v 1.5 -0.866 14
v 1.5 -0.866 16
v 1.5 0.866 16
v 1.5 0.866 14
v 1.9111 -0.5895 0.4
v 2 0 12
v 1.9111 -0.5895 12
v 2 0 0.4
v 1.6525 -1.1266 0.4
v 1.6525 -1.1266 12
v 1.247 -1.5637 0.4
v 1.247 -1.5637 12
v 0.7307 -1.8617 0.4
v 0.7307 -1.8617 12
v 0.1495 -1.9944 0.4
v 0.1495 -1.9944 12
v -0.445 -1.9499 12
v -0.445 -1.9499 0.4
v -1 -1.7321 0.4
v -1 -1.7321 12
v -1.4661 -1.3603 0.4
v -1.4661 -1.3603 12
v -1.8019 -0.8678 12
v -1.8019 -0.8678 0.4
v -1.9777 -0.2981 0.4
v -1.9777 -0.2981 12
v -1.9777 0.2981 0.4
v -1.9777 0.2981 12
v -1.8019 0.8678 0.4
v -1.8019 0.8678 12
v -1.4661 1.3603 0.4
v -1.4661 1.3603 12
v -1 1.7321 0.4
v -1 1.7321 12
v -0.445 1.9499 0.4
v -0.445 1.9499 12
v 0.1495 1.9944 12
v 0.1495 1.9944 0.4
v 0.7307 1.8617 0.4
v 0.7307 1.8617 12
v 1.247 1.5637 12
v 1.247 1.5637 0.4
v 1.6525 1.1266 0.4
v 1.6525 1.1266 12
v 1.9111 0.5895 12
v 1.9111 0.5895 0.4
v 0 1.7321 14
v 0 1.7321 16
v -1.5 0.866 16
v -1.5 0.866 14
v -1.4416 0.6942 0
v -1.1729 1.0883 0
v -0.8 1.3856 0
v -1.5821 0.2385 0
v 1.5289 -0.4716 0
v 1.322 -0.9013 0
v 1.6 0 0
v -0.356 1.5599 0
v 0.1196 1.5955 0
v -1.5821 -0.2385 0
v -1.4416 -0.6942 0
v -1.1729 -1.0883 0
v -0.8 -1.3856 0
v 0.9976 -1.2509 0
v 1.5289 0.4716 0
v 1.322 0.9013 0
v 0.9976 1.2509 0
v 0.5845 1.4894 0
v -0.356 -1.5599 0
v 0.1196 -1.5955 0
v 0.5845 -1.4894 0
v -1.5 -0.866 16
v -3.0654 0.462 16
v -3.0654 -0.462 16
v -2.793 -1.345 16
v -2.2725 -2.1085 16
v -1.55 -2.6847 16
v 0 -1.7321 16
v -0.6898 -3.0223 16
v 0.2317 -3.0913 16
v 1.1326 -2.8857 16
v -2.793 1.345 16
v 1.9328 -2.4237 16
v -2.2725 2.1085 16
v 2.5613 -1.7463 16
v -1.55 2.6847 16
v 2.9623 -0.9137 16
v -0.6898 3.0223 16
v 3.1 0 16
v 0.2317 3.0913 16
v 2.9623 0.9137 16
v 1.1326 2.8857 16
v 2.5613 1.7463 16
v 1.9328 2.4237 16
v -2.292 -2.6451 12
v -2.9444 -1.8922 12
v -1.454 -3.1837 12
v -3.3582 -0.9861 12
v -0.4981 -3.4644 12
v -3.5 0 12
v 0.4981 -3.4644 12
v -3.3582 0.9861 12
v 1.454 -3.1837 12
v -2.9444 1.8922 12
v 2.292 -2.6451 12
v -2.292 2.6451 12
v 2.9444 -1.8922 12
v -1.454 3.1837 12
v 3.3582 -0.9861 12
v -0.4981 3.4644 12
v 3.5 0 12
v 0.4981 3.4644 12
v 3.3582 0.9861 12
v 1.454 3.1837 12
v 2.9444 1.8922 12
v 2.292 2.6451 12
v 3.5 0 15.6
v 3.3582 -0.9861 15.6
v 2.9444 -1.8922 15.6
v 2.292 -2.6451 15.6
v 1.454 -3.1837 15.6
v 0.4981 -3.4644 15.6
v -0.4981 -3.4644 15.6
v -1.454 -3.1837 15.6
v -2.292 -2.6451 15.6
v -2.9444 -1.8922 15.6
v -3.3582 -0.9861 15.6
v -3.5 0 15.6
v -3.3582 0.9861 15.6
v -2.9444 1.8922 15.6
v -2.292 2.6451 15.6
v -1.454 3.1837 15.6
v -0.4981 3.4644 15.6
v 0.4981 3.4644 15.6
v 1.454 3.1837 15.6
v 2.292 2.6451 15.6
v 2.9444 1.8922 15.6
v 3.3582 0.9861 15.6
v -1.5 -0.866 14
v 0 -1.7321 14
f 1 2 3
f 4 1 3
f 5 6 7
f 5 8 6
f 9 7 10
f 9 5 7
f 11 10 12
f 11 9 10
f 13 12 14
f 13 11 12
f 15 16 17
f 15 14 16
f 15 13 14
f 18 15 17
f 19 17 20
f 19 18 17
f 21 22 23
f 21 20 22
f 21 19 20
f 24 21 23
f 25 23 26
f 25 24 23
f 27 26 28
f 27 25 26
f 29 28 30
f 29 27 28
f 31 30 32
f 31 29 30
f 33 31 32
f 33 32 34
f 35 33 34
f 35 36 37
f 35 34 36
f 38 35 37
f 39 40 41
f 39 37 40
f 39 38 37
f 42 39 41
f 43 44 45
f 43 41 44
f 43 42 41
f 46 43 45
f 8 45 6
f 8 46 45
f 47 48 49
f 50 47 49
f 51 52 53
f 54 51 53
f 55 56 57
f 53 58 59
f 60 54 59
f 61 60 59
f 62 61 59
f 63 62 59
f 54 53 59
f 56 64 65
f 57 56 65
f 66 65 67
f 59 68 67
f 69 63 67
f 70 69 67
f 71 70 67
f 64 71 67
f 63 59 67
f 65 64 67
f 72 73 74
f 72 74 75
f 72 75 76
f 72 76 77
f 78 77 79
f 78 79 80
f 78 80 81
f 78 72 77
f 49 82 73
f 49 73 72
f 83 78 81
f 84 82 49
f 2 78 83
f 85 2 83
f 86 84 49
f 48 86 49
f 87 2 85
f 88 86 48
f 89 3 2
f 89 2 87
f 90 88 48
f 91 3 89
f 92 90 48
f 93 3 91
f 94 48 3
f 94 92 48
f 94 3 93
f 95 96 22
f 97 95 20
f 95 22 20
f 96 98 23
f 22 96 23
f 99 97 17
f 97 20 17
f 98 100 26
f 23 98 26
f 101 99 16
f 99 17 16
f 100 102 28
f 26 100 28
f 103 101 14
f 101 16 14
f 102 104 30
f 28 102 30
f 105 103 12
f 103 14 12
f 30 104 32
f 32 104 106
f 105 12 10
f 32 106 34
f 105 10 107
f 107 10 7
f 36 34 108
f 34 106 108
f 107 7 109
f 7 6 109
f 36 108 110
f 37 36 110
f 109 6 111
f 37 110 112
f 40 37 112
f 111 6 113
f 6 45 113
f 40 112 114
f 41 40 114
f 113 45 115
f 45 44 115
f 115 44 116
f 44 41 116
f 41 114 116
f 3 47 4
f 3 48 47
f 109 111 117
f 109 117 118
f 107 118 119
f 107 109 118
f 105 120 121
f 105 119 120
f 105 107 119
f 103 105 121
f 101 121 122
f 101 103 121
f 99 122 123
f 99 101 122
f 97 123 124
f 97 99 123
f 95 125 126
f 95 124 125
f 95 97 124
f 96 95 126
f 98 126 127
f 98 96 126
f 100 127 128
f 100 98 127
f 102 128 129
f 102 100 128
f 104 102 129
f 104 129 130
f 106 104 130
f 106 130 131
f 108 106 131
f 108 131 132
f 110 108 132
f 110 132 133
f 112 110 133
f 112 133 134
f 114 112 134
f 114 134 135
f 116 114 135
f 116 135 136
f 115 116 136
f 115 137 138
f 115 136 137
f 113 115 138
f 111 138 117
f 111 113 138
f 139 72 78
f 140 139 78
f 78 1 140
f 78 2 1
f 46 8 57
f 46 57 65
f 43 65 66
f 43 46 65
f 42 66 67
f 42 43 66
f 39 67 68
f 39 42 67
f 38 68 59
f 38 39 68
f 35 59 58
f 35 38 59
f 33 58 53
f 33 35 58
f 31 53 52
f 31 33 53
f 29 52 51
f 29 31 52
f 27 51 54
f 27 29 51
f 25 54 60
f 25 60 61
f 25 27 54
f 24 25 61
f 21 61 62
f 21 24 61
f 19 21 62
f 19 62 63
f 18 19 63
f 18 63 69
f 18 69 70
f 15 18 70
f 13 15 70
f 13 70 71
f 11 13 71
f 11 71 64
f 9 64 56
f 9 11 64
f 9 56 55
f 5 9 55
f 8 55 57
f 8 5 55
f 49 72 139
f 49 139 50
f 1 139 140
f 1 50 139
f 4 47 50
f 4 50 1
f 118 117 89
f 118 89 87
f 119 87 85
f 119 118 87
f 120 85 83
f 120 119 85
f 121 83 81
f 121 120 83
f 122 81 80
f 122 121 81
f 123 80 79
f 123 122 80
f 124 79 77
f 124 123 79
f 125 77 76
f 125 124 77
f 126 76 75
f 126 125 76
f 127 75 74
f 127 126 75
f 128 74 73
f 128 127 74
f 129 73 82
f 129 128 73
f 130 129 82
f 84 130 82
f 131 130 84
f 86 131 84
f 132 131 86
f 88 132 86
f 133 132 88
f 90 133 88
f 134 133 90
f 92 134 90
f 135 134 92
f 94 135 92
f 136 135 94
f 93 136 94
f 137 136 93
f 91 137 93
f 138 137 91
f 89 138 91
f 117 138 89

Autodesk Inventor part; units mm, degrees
ref_plane "YZ Plane" through (0, 0, 0) normal (1, 0, 0) x (0, 1, 0)
ref_plane "XZ Plane" through (0, 0, 0) normal (0, 1, 0) x (-1, 0, 0)
ref_plane "XY Plane" through (0, 0, 0) normal (0, 0, 1) x (1, 0, 0)
sketch "Sketch1" plane through (0, 0, 0) normal (0, 0, 1) x (1, 0, 0)
  circle A0 centre (0, 0) radius 2
  dimension "Diameter" = 4
extrude "Extrusion1" add sketch "Sketch1" along normal blind 12
sketch "Sketch2" plane through (0, 0, 12) normal (0, 0, 1) x (1, 0, 0)
  circle A0 centre (0, 0) radius 2 projected
  circle A1 centre (0, 0) radius 3.5
  dimension "Head_Diameter" = 7
extrude "Extrusion2" add sketch "Sketch2" along normal blind 4 contours A0 | A1
sketch "Sketch3" plane through (0, 0, 16) normal (0, 0, 1) x (1, 0, 0)
  circle A0 centre (0, 0) radius 3.5 projected
  circle A1 centre (0, 0) radius 1.7321 construction
  line L0 (0, 1.7321) -> (1.5, 0.866)
  line L1 (1.5, -0.866) -> (1.5, 0.866)
  line L2 (0, 1.7321) -> (-1.5, 0.866)
  line L3 (-1.5, -0.866) -> (-1.5, 0.866)
  line L4 (-1.5, -0.866) -> (0, -1.7321)
  line L5 (1.5, -0.866) -> (0, -1.7321)
  dimension "Hex_Width" = 3
extrude "Extrusion3" cut sketch "Sketch3" against normal blind 2 contours L0 L1 L5 L4 L3 L2
thread "Thread1" size "M4x0.7" class "4g6g" standard "ANSI Metric M Profile" length 20
chamfer "Chamfer1" distance 0.4 angle 45 2 edges at (-3.5, 0, 16) (-2, 0, 0)
equation "\"d9\" = ThreadLength"
equation "\"d12\" = Chamfer"
equation "\"ThreadLength\" = 20"
equation "\"Chamfer\" = 0.4"
properties part number "SCREW, SOCKET HD, P, 12_9, M4X0_7X12" material "Steel, MS"
